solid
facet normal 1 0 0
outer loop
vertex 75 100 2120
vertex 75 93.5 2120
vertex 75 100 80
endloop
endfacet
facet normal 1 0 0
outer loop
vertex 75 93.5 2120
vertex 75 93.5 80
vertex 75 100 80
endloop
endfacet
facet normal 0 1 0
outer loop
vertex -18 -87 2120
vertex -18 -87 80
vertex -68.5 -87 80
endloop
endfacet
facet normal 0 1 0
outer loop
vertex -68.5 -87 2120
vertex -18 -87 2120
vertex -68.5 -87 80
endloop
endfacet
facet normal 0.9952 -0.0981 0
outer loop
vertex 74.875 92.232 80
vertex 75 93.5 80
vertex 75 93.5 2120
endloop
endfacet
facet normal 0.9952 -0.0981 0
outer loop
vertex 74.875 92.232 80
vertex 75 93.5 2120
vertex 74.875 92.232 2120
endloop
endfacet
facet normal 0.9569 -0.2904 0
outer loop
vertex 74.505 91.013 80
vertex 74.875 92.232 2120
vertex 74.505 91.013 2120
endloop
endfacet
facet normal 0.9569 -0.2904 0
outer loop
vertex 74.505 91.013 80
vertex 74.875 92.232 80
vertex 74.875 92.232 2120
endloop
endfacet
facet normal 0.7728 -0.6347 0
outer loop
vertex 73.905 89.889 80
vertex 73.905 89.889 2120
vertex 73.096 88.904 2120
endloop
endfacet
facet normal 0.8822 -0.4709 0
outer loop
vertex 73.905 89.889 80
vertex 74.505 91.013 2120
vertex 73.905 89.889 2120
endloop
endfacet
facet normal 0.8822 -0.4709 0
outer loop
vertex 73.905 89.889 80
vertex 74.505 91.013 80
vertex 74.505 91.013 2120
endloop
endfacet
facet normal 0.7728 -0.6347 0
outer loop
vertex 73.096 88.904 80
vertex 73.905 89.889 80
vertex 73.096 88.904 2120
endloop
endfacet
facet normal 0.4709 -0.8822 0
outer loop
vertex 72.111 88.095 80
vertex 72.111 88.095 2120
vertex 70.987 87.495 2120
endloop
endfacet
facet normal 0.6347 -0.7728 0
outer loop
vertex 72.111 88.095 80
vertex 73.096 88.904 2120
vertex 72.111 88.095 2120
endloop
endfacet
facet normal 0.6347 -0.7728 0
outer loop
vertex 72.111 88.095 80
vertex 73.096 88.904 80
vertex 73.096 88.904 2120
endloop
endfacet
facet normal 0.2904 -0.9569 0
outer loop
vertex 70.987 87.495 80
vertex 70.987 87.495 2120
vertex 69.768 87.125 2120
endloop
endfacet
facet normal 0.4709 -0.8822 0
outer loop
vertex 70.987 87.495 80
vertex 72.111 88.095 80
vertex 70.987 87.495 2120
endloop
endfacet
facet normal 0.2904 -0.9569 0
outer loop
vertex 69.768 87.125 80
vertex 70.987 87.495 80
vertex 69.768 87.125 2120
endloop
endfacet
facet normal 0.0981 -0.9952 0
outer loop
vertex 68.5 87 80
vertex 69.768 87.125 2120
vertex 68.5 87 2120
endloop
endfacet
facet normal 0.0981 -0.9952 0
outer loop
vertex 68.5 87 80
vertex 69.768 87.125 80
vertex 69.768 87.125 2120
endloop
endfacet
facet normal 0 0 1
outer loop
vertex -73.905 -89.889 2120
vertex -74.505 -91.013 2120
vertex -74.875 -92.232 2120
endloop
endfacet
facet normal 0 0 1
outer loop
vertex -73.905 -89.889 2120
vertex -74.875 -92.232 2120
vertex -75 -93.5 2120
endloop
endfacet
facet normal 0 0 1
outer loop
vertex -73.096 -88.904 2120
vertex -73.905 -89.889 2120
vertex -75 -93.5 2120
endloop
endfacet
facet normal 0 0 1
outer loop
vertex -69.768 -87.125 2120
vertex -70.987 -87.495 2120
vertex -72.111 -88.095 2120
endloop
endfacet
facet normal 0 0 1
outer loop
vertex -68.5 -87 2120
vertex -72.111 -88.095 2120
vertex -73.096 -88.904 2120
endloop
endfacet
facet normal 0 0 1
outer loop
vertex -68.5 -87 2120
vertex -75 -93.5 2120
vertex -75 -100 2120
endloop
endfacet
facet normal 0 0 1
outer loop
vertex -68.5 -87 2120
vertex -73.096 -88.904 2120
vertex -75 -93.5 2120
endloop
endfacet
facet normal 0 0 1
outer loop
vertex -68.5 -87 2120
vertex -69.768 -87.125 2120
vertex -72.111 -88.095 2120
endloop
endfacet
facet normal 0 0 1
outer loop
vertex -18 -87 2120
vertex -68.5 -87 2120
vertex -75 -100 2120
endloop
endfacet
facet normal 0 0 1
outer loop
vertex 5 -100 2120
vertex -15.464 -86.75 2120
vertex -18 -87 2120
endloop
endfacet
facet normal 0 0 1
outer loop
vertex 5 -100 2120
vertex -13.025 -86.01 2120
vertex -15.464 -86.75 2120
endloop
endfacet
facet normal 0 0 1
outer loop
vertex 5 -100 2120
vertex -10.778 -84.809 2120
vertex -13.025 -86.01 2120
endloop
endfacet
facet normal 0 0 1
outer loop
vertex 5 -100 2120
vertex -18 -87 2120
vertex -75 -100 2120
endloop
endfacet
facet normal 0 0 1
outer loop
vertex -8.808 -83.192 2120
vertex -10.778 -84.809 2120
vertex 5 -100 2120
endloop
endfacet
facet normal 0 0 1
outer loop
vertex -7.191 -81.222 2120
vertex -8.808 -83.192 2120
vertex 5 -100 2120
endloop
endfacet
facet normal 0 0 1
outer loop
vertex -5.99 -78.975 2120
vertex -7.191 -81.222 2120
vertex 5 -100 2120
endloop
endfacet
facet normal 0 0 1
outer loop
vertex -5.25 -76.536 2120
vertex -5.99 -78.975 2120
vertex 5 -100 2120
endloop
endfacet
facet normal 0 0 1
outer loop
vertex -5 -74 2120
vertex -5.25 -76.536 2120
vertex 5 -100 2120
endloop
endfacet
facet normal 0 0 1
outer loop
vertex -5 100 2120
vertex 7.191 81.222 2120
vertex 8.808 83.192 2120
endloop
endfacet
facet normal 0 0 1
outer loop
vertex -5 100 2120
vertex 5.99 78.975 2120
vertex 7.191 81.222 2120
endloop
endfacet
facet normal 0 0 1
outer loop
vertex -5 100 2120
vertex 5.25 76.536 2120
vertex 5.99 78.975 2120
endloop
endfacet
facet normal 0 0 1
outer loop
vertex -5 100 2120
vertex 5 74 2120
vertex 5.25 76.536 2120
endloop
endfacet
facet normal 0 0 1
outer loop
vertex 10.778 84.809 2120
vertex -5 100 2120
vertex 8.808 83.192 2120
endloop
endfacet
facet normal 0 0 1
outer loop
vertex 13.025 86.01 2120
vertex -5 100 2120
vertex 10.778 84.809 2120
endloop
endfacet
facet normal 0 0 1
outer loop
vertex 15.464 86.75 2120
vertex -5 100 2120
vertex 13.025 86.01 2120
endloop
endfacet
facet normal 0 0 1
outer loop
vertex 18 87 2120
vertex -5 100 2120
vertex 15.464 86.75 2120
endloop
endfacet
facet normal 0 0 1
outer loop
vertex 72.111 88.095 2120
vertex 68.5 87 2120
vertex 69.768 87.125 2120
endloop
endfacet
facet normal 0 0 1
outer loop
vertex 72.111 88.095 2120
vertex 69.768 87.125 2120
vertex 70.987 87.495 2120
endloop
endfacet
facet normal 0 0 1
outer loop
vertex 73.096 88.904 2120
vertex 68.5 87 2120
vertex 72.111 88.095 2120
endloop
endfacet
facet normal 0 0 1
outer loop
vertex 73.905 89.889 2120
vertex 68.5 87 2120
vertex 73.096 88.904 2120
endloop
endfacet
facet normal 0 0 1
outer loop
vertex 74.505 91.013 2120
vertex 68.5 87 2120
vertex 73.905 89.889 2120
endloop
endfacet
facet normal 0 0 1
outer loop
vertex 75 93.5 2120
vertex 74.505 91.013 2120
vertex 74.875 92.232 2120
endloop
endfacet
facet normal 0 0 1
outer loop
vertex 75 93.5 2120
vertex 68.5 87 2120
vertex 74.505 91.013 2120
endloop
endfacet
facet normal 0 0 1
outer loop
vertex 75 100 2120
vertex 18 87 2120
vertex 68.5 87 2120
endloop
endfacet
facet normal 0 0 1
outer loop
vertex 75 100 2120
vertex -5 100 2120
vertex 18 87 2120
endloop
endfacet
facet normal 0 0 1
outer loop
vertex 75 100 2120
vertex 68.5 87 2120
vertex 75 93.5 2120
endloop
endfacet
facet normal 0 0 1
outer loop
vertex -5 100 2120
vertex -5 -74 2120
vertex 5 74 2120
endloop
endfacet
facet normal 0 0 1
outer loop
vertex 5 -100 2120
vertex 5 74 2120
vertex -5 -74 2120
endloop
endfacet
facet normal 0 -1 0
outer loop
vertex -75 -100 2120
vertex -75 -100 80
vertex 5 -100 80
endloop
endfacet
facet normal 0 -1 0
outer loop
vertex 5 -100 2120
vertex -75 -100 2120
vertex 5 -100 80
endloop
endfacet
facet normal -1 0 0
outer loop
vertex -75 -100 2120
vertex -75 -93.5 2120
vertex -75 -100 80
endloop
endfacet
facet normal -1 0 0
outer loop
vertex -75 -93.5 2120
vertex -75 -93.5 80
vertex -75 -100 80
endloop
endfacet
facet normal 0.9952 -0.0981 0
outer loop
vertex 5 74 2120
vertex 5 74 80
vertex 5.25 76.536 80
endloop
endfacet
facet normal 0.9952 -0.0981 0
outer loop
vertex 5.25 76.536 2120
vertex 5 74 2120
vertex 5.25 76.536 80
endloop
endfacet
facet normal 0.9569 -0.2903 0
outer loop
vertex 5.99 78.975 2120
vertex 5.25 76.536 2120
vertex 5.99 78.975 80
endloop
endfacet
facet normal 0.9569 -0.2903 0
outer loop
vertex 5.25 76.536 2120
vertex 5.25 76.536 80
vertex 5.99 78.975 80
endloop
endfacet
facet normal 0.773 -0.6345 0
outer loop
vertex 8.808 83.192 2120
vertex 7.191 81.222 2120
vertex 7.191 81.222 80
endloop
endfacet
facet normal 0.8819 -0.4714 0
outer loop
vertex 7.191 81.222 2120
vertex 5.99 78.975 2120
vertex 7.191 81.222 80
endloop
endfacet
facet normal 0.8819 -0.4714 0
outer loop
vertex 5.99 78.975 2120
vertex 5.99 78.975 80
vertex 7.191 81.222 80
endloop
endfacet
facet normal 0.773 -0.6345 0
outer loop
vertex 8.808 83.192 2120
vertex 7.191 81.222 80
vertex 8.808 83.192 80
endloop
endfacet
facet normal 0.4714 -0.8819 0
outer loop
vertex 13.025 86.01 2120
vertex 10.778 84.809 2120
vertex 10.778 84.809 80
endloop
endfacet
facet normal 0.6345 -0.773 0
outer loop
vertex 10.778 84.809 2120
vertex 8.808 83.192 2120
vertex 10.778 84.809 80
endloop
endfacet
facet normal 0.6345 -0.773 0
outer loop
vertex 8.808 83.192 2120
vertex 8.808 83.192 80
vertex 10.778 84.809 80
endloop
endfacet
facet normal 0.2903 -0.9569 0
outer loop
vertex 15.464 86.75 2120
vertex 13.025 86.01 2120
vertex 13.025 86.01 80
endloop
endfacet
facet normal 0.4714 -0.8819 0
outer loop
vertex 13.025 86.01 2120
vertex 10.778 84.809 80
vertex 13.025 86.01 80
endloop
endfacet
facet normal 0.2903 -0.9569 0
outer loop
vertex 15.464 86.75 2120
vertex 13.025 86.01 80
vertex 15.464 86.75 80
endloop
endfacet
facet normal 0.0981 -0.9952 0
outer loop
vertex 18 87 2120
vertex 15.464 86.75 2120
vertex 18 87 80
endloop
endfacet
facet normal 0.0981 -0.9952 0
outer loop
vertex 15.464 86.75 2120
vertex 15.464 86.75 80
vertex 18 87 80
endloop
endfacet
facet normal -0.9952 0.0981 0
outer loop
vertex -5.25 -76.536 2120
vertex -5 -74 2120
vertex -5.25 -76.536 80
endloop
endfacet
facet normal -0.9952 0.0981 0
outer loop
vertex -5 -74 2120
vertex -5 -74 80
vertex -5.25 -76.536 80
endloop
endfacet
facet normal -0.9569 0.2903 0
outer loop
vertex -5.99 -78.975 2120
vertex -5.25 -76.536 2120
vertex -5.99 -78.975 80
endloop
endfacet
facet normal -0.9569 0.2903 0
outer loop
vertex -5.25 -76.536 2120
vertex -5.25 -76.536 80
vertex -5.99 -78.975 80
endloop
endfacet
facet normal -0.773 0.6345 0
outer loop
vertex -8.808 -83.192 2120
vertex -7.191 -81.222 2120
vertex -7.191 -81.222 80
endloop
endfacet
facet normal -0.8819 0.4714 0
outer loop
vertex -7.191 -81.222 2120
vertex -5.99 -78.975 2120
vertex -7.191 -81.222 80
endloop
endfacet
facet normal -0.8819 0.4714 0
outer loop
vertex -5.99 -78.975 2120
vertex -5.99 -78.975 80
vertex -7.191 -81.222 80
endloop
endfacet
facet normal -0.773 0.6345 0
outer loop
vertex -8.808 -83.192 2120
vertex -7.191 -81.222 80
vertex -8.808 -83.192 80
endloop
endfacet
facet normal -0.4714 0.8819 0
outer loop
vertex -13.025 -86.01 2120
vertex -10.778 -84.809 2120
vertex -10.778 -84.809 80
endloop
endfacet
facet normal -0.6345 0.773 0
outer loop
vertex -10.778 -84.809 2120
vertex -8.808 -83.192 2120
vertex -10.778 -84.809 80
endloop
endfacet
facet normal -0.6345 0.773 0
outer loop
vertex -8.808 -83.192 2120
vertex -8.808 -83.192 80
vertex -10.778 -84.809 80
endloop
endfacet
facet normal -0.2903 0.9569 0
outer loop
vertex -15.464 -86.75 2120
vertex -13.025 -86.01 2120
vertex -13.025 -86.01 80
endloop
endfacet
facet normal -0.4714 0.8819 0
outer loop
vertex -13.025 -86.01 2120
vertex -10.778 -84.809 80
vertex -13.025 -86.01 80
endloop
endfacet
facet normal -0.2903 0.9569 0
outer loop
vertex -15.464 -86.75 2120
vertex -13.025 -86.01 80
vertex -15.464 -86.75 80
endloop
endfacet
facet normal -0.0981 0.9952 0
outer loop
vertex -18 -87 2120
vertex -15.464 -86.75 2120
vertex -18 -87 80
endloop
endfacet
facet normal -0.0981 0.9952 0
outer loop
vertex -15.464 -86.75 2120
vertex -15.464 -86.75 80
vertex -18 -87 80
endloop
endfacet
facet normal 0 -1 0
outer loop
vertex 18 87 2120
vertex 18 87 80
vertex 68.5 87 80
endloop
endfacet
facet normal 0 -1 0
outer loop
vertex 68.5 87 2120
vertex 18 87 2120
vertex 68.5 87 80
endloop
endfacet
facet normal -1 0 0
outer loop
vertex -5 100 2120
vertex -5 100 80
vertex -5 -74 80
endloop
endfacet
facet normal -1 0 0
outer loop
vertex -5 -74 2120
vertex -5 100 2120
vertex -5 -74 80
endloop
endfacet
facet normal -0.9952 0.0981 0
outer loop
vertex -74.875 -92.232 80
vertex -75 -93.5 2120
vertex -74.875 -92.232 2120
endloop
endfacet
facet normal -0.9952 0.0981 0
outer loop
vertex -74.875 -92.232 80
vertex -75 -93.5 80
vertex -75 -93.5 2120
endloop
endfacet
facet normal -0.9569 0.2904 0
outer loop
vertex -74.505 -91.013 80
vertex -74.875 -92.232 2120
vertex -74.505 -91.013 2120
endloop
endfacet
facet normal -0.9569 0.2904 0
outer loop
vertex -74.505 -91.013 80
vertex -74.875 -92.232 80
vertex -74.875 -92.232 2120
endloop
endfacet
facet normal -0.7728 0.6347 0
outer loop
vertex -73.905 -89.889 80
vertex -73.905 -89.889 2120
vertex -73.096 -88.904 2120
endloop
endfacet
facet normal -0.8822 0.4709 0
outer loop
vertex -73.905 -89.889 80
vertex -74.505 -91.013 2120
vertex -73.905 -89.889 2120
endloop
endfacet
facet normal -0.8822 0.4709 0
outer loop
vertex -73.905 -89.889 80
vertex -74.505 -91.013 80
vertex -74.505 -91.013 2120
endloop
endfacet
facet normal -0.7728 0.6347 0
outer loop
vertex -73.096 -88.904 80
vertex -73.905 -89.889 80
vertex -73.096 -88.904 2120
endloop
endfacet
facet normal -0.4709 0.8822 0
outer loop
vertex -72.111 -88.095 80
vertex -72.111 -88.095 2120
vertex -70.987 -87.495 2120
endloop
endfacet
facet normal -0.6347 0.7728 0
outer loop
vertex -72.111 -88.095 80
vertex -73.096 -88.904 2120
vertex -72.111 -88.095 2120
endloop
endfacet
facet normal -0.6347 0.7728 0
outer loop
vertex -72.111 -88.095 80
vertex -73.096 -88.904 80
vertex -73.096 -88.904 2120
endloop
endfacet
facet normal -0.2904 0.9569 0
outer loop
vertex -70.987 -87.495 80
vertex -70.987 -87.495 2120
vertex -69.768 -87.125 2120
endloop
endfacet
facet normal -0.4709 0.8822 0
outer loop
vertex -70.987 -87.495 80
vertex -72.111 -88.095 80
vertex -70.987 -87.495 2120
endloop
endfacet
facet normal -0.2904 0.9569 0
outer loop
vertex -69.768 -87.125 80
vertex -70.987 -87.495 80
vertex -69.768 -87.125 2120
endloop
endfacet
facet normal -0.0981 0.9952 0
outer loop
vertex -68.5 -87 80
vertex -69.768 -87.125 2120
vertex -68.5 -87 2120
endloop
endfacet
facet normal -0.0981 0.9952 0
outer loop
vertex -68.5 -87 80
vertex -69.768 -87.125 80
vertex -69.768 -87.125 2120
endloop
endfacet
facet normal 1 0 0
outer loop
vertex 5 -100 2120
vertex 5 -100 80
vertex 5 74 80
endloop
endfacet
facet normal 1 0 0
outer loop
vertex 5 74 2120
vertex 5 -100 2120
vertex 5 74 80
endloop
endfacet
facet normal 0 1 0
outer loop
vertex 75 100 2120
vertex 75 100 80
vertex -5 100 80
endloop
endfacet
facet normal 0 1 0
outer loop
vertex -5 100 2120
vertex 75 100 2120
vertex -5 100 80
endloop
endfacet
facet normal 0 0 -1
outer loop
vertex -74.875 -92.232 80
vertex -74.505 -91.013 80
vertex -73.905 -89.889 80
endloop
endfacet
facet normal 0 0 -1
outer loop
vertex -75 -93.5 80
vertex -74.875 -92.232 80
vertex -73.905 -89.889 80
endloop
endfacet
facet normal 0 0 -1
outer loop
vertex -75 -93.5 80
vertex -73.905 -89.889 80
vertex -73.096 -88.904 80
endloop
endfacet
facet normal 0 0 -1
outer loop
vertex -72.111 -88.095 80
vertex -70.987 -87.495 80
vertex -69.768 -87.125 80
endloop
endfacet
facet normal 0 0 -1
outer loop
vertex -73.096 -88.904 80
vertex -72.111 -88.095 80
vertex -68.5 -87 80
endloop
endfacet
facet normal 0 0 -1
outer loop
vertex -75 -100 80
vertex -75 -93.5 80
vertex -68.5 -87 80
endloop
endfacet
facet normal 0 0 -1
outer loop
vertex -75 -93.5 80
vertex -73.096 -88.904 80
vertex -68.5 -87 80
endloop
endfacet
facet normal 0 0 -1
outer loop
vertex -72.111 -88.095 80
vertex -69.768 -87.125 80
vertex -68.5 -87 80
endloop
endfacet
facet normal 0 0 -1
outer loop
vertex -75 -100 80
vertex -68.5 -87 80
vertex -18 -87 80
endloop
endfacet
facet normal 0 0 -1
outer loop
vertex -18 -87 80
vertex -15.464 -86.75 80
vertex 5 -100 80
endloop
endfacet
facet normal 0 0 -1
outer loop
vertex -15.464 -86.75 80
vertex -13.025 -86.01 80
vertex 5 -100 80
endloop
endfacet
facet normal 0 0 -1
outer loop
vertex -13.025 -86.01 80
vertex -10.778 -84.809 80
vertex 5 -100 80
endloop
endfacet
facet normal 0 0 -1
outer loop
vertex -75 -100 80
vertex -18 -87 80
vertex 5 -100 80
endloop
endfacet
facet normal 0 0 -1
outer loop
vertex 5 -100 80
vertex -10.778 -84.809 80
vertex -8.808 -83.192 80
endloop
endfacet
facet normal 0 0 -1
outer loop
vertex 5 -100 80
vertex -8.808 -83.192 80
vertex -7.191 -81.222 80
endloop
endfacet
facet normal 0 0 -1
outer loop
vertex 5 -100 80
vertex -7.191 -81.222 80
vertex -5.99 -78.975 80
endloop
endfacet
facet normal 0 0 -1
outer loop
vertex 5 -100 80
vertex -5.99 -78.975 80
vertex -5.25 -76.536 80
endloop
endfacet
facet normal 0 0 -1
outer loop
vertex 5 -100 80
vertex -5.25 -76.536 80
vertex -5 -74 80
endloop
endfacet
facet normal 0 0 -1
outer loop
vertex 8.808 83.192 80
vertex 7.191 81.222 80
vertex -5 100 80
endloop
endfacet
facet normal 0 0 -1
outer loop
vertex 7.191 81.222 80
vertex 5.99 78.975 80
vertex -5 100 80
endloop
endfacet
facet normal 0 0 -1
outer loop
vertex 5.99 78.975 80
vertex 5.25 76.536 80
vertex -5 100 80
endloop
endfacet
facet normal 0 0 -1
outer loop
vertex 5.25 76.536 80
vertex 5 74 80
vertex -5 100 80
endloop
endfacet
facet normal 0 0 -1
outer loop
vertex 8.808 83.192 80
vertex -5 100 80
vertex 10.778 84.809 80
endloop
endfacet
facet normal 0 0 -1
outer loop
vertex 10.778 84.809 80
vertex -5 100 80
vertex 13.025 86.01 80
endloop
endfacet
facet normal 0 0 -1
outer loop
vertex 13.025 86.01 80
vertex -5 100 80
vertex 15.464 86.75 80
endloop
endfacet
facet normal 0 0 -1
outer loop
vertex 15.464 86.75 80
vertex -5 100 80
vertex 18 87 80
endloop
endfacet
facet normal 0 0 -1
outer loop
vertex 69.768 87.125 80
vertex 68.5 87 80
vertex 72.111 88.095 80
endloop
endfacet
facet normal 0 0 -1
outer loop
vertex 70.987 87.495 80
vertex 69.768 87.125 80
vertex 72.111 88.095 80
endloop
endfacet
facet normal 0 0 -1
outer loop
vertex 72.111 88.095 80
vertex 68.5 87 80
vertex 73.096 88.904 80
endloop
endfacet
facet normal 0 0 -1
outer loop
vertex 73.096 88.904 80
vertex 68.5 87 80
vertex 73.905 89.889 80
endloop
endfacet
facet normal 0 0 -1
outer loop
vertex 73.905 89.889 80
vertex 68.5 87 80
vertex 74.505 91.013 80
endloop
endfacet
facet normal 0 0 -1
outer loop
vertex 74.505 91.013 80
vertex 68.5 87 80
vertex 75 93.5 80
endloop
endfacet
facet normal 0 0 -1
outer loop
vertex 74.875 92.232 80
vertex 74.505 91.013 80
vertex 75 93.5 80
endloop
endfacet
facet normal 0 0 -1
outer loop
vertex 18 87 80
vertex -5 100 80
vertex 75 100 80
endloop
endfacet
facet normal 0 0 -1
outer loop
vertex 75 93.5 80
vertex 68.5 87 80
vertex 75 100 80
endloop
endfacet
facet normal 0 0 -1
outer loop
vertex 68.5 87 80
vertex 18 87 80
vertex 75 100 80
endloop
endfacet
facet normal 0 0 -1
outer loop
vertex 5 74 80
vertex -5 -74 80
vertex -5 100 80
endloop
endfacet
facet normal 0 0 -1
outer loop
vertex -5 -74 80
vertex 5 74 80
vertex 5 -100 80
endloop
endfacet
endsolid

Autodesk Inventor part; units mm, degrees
ref_plane "Start plane" through (0, 0, 80) normal (0, 0, 1) x (1, 0, 0)
ref_plane "End plane" through (0, 0, 2120) normal (0, 0, 1) x (1, 0, 0)
sketch "Sketch" plane through (0, 0, 0) normal (0, 0, 1) x (1, 0, 0)
  line L0 (-75, -100) -> (5, -100)
  line L1 (5, -100) -> (5, 74)
  line L2 (18, 87) -> (68.5, 87)
  line L3 (75, 93.5) -> (75, 100)
  line L4 (75, 100) -> (-5, 100)
  line L5 (-5, 100) -> (-5, -74)
  line L6 (-18, -87) -> (-68.5, -87)
  line L7 (-75, -93.5) -> (-75, -100)
  line L8 (173.6154, 0) -> (-40.1539, 0) construction
  line L9 (0, -212) -> (0, 68) construction
  arc A0 (-18, -87) -> (-5, -74) centre (-18, -74) ccw
  arc A1 (18, 87) -> (5, 74) centre (18, 74) ccw
  arc A2 (-68.5, -87) -> (-75, -93.5) centre (-68.5, -93.5) ccw
  arc A3 (68.5, 87) -> (75, 93.5) centre (68.5, 93.5) ccw
  line L10 (0, 162.4) -> (0, -274.4) construction
  line L11 (-126.3385, 0) -> (223.6078, 0) construction
  point P0 (5, 87)
  point P1 (75, 87)
  point P2 (-5, -87)
  point P3 (-75, -87)
  dimension "d0" = 200
  dimension "d1" = 80
  dimension "d2" = 80
  dimension "d3" = 13
  dimension "d4" = 13
  dimension "d5" = 10
  dimension "d10" = 13
  dimension "d11" = 6.5
  dimension "d12" = 5
  dimension "d13" = 100
extrude "Body" add sketch "Sketch" along normal up to surface (2040 mm away) from surface at 80
sketch "Sketch3" plane through (0, 0, 0) normal (0, 0, 1) x (1, 0, 0)
  line L0 (0, 0) -> (10, 0)
ref_plane "Work Plane3" through (0, 0, 0) normal (0, -1, 0) x (1, 0, 0)
sketch "Sketch4" plane through (0, 0, 0) normal (0, -1, 0) x (1, 0, 0)
  line L0 (-2, 80) -> (12, 80)
  line L1 (-2, 2120) -> (12, 2120)
  dimension "d17" = 2040
ref_plane "Work Plane4" through (-1500, 0, 80) normal (0, 0, -1) x (-1, 0, 0)
split "Split1" plane through (-1500, 0, 80) removes the side toward (0, 0, -1)
ref_plane "Work Plane5" through (3500, 0, 2120) normal (0, 0, 1) x (1, 0, 0)
split "Split2" plane through (3500, 0, 2120) removes the side toward (0, 0, 1)
equation "\"d0\" = G_H"
equation "\"d1\" = G_W"
equation "\"d2\" = G_W"
equation "\"d3\" = G_T1"
equation "\"d4\" = G_T1"
equation "\"d5\" = G_T"
equation "\"d10\" = G_IR"
equation "\"d11\" = G_ER"
equation "\"d12\" = 0.5 * d5"
equation "\"d13\" = 0.5 * d0"
equation "\"d6\" = G_L"
equation "\"G_W\" = 80"
equation "\"G_H\" = 200"
equation "\"G_T\" = 10"
equation "\"G_T1\" = 13"
equation "\"G_IR\" = 13"
equation "\"G_ER\" = 6.5"
equation "\"G_L\" = d17"
properties part number "DIN1027 - Z 200 - 2040" material "Steel, Mild"
